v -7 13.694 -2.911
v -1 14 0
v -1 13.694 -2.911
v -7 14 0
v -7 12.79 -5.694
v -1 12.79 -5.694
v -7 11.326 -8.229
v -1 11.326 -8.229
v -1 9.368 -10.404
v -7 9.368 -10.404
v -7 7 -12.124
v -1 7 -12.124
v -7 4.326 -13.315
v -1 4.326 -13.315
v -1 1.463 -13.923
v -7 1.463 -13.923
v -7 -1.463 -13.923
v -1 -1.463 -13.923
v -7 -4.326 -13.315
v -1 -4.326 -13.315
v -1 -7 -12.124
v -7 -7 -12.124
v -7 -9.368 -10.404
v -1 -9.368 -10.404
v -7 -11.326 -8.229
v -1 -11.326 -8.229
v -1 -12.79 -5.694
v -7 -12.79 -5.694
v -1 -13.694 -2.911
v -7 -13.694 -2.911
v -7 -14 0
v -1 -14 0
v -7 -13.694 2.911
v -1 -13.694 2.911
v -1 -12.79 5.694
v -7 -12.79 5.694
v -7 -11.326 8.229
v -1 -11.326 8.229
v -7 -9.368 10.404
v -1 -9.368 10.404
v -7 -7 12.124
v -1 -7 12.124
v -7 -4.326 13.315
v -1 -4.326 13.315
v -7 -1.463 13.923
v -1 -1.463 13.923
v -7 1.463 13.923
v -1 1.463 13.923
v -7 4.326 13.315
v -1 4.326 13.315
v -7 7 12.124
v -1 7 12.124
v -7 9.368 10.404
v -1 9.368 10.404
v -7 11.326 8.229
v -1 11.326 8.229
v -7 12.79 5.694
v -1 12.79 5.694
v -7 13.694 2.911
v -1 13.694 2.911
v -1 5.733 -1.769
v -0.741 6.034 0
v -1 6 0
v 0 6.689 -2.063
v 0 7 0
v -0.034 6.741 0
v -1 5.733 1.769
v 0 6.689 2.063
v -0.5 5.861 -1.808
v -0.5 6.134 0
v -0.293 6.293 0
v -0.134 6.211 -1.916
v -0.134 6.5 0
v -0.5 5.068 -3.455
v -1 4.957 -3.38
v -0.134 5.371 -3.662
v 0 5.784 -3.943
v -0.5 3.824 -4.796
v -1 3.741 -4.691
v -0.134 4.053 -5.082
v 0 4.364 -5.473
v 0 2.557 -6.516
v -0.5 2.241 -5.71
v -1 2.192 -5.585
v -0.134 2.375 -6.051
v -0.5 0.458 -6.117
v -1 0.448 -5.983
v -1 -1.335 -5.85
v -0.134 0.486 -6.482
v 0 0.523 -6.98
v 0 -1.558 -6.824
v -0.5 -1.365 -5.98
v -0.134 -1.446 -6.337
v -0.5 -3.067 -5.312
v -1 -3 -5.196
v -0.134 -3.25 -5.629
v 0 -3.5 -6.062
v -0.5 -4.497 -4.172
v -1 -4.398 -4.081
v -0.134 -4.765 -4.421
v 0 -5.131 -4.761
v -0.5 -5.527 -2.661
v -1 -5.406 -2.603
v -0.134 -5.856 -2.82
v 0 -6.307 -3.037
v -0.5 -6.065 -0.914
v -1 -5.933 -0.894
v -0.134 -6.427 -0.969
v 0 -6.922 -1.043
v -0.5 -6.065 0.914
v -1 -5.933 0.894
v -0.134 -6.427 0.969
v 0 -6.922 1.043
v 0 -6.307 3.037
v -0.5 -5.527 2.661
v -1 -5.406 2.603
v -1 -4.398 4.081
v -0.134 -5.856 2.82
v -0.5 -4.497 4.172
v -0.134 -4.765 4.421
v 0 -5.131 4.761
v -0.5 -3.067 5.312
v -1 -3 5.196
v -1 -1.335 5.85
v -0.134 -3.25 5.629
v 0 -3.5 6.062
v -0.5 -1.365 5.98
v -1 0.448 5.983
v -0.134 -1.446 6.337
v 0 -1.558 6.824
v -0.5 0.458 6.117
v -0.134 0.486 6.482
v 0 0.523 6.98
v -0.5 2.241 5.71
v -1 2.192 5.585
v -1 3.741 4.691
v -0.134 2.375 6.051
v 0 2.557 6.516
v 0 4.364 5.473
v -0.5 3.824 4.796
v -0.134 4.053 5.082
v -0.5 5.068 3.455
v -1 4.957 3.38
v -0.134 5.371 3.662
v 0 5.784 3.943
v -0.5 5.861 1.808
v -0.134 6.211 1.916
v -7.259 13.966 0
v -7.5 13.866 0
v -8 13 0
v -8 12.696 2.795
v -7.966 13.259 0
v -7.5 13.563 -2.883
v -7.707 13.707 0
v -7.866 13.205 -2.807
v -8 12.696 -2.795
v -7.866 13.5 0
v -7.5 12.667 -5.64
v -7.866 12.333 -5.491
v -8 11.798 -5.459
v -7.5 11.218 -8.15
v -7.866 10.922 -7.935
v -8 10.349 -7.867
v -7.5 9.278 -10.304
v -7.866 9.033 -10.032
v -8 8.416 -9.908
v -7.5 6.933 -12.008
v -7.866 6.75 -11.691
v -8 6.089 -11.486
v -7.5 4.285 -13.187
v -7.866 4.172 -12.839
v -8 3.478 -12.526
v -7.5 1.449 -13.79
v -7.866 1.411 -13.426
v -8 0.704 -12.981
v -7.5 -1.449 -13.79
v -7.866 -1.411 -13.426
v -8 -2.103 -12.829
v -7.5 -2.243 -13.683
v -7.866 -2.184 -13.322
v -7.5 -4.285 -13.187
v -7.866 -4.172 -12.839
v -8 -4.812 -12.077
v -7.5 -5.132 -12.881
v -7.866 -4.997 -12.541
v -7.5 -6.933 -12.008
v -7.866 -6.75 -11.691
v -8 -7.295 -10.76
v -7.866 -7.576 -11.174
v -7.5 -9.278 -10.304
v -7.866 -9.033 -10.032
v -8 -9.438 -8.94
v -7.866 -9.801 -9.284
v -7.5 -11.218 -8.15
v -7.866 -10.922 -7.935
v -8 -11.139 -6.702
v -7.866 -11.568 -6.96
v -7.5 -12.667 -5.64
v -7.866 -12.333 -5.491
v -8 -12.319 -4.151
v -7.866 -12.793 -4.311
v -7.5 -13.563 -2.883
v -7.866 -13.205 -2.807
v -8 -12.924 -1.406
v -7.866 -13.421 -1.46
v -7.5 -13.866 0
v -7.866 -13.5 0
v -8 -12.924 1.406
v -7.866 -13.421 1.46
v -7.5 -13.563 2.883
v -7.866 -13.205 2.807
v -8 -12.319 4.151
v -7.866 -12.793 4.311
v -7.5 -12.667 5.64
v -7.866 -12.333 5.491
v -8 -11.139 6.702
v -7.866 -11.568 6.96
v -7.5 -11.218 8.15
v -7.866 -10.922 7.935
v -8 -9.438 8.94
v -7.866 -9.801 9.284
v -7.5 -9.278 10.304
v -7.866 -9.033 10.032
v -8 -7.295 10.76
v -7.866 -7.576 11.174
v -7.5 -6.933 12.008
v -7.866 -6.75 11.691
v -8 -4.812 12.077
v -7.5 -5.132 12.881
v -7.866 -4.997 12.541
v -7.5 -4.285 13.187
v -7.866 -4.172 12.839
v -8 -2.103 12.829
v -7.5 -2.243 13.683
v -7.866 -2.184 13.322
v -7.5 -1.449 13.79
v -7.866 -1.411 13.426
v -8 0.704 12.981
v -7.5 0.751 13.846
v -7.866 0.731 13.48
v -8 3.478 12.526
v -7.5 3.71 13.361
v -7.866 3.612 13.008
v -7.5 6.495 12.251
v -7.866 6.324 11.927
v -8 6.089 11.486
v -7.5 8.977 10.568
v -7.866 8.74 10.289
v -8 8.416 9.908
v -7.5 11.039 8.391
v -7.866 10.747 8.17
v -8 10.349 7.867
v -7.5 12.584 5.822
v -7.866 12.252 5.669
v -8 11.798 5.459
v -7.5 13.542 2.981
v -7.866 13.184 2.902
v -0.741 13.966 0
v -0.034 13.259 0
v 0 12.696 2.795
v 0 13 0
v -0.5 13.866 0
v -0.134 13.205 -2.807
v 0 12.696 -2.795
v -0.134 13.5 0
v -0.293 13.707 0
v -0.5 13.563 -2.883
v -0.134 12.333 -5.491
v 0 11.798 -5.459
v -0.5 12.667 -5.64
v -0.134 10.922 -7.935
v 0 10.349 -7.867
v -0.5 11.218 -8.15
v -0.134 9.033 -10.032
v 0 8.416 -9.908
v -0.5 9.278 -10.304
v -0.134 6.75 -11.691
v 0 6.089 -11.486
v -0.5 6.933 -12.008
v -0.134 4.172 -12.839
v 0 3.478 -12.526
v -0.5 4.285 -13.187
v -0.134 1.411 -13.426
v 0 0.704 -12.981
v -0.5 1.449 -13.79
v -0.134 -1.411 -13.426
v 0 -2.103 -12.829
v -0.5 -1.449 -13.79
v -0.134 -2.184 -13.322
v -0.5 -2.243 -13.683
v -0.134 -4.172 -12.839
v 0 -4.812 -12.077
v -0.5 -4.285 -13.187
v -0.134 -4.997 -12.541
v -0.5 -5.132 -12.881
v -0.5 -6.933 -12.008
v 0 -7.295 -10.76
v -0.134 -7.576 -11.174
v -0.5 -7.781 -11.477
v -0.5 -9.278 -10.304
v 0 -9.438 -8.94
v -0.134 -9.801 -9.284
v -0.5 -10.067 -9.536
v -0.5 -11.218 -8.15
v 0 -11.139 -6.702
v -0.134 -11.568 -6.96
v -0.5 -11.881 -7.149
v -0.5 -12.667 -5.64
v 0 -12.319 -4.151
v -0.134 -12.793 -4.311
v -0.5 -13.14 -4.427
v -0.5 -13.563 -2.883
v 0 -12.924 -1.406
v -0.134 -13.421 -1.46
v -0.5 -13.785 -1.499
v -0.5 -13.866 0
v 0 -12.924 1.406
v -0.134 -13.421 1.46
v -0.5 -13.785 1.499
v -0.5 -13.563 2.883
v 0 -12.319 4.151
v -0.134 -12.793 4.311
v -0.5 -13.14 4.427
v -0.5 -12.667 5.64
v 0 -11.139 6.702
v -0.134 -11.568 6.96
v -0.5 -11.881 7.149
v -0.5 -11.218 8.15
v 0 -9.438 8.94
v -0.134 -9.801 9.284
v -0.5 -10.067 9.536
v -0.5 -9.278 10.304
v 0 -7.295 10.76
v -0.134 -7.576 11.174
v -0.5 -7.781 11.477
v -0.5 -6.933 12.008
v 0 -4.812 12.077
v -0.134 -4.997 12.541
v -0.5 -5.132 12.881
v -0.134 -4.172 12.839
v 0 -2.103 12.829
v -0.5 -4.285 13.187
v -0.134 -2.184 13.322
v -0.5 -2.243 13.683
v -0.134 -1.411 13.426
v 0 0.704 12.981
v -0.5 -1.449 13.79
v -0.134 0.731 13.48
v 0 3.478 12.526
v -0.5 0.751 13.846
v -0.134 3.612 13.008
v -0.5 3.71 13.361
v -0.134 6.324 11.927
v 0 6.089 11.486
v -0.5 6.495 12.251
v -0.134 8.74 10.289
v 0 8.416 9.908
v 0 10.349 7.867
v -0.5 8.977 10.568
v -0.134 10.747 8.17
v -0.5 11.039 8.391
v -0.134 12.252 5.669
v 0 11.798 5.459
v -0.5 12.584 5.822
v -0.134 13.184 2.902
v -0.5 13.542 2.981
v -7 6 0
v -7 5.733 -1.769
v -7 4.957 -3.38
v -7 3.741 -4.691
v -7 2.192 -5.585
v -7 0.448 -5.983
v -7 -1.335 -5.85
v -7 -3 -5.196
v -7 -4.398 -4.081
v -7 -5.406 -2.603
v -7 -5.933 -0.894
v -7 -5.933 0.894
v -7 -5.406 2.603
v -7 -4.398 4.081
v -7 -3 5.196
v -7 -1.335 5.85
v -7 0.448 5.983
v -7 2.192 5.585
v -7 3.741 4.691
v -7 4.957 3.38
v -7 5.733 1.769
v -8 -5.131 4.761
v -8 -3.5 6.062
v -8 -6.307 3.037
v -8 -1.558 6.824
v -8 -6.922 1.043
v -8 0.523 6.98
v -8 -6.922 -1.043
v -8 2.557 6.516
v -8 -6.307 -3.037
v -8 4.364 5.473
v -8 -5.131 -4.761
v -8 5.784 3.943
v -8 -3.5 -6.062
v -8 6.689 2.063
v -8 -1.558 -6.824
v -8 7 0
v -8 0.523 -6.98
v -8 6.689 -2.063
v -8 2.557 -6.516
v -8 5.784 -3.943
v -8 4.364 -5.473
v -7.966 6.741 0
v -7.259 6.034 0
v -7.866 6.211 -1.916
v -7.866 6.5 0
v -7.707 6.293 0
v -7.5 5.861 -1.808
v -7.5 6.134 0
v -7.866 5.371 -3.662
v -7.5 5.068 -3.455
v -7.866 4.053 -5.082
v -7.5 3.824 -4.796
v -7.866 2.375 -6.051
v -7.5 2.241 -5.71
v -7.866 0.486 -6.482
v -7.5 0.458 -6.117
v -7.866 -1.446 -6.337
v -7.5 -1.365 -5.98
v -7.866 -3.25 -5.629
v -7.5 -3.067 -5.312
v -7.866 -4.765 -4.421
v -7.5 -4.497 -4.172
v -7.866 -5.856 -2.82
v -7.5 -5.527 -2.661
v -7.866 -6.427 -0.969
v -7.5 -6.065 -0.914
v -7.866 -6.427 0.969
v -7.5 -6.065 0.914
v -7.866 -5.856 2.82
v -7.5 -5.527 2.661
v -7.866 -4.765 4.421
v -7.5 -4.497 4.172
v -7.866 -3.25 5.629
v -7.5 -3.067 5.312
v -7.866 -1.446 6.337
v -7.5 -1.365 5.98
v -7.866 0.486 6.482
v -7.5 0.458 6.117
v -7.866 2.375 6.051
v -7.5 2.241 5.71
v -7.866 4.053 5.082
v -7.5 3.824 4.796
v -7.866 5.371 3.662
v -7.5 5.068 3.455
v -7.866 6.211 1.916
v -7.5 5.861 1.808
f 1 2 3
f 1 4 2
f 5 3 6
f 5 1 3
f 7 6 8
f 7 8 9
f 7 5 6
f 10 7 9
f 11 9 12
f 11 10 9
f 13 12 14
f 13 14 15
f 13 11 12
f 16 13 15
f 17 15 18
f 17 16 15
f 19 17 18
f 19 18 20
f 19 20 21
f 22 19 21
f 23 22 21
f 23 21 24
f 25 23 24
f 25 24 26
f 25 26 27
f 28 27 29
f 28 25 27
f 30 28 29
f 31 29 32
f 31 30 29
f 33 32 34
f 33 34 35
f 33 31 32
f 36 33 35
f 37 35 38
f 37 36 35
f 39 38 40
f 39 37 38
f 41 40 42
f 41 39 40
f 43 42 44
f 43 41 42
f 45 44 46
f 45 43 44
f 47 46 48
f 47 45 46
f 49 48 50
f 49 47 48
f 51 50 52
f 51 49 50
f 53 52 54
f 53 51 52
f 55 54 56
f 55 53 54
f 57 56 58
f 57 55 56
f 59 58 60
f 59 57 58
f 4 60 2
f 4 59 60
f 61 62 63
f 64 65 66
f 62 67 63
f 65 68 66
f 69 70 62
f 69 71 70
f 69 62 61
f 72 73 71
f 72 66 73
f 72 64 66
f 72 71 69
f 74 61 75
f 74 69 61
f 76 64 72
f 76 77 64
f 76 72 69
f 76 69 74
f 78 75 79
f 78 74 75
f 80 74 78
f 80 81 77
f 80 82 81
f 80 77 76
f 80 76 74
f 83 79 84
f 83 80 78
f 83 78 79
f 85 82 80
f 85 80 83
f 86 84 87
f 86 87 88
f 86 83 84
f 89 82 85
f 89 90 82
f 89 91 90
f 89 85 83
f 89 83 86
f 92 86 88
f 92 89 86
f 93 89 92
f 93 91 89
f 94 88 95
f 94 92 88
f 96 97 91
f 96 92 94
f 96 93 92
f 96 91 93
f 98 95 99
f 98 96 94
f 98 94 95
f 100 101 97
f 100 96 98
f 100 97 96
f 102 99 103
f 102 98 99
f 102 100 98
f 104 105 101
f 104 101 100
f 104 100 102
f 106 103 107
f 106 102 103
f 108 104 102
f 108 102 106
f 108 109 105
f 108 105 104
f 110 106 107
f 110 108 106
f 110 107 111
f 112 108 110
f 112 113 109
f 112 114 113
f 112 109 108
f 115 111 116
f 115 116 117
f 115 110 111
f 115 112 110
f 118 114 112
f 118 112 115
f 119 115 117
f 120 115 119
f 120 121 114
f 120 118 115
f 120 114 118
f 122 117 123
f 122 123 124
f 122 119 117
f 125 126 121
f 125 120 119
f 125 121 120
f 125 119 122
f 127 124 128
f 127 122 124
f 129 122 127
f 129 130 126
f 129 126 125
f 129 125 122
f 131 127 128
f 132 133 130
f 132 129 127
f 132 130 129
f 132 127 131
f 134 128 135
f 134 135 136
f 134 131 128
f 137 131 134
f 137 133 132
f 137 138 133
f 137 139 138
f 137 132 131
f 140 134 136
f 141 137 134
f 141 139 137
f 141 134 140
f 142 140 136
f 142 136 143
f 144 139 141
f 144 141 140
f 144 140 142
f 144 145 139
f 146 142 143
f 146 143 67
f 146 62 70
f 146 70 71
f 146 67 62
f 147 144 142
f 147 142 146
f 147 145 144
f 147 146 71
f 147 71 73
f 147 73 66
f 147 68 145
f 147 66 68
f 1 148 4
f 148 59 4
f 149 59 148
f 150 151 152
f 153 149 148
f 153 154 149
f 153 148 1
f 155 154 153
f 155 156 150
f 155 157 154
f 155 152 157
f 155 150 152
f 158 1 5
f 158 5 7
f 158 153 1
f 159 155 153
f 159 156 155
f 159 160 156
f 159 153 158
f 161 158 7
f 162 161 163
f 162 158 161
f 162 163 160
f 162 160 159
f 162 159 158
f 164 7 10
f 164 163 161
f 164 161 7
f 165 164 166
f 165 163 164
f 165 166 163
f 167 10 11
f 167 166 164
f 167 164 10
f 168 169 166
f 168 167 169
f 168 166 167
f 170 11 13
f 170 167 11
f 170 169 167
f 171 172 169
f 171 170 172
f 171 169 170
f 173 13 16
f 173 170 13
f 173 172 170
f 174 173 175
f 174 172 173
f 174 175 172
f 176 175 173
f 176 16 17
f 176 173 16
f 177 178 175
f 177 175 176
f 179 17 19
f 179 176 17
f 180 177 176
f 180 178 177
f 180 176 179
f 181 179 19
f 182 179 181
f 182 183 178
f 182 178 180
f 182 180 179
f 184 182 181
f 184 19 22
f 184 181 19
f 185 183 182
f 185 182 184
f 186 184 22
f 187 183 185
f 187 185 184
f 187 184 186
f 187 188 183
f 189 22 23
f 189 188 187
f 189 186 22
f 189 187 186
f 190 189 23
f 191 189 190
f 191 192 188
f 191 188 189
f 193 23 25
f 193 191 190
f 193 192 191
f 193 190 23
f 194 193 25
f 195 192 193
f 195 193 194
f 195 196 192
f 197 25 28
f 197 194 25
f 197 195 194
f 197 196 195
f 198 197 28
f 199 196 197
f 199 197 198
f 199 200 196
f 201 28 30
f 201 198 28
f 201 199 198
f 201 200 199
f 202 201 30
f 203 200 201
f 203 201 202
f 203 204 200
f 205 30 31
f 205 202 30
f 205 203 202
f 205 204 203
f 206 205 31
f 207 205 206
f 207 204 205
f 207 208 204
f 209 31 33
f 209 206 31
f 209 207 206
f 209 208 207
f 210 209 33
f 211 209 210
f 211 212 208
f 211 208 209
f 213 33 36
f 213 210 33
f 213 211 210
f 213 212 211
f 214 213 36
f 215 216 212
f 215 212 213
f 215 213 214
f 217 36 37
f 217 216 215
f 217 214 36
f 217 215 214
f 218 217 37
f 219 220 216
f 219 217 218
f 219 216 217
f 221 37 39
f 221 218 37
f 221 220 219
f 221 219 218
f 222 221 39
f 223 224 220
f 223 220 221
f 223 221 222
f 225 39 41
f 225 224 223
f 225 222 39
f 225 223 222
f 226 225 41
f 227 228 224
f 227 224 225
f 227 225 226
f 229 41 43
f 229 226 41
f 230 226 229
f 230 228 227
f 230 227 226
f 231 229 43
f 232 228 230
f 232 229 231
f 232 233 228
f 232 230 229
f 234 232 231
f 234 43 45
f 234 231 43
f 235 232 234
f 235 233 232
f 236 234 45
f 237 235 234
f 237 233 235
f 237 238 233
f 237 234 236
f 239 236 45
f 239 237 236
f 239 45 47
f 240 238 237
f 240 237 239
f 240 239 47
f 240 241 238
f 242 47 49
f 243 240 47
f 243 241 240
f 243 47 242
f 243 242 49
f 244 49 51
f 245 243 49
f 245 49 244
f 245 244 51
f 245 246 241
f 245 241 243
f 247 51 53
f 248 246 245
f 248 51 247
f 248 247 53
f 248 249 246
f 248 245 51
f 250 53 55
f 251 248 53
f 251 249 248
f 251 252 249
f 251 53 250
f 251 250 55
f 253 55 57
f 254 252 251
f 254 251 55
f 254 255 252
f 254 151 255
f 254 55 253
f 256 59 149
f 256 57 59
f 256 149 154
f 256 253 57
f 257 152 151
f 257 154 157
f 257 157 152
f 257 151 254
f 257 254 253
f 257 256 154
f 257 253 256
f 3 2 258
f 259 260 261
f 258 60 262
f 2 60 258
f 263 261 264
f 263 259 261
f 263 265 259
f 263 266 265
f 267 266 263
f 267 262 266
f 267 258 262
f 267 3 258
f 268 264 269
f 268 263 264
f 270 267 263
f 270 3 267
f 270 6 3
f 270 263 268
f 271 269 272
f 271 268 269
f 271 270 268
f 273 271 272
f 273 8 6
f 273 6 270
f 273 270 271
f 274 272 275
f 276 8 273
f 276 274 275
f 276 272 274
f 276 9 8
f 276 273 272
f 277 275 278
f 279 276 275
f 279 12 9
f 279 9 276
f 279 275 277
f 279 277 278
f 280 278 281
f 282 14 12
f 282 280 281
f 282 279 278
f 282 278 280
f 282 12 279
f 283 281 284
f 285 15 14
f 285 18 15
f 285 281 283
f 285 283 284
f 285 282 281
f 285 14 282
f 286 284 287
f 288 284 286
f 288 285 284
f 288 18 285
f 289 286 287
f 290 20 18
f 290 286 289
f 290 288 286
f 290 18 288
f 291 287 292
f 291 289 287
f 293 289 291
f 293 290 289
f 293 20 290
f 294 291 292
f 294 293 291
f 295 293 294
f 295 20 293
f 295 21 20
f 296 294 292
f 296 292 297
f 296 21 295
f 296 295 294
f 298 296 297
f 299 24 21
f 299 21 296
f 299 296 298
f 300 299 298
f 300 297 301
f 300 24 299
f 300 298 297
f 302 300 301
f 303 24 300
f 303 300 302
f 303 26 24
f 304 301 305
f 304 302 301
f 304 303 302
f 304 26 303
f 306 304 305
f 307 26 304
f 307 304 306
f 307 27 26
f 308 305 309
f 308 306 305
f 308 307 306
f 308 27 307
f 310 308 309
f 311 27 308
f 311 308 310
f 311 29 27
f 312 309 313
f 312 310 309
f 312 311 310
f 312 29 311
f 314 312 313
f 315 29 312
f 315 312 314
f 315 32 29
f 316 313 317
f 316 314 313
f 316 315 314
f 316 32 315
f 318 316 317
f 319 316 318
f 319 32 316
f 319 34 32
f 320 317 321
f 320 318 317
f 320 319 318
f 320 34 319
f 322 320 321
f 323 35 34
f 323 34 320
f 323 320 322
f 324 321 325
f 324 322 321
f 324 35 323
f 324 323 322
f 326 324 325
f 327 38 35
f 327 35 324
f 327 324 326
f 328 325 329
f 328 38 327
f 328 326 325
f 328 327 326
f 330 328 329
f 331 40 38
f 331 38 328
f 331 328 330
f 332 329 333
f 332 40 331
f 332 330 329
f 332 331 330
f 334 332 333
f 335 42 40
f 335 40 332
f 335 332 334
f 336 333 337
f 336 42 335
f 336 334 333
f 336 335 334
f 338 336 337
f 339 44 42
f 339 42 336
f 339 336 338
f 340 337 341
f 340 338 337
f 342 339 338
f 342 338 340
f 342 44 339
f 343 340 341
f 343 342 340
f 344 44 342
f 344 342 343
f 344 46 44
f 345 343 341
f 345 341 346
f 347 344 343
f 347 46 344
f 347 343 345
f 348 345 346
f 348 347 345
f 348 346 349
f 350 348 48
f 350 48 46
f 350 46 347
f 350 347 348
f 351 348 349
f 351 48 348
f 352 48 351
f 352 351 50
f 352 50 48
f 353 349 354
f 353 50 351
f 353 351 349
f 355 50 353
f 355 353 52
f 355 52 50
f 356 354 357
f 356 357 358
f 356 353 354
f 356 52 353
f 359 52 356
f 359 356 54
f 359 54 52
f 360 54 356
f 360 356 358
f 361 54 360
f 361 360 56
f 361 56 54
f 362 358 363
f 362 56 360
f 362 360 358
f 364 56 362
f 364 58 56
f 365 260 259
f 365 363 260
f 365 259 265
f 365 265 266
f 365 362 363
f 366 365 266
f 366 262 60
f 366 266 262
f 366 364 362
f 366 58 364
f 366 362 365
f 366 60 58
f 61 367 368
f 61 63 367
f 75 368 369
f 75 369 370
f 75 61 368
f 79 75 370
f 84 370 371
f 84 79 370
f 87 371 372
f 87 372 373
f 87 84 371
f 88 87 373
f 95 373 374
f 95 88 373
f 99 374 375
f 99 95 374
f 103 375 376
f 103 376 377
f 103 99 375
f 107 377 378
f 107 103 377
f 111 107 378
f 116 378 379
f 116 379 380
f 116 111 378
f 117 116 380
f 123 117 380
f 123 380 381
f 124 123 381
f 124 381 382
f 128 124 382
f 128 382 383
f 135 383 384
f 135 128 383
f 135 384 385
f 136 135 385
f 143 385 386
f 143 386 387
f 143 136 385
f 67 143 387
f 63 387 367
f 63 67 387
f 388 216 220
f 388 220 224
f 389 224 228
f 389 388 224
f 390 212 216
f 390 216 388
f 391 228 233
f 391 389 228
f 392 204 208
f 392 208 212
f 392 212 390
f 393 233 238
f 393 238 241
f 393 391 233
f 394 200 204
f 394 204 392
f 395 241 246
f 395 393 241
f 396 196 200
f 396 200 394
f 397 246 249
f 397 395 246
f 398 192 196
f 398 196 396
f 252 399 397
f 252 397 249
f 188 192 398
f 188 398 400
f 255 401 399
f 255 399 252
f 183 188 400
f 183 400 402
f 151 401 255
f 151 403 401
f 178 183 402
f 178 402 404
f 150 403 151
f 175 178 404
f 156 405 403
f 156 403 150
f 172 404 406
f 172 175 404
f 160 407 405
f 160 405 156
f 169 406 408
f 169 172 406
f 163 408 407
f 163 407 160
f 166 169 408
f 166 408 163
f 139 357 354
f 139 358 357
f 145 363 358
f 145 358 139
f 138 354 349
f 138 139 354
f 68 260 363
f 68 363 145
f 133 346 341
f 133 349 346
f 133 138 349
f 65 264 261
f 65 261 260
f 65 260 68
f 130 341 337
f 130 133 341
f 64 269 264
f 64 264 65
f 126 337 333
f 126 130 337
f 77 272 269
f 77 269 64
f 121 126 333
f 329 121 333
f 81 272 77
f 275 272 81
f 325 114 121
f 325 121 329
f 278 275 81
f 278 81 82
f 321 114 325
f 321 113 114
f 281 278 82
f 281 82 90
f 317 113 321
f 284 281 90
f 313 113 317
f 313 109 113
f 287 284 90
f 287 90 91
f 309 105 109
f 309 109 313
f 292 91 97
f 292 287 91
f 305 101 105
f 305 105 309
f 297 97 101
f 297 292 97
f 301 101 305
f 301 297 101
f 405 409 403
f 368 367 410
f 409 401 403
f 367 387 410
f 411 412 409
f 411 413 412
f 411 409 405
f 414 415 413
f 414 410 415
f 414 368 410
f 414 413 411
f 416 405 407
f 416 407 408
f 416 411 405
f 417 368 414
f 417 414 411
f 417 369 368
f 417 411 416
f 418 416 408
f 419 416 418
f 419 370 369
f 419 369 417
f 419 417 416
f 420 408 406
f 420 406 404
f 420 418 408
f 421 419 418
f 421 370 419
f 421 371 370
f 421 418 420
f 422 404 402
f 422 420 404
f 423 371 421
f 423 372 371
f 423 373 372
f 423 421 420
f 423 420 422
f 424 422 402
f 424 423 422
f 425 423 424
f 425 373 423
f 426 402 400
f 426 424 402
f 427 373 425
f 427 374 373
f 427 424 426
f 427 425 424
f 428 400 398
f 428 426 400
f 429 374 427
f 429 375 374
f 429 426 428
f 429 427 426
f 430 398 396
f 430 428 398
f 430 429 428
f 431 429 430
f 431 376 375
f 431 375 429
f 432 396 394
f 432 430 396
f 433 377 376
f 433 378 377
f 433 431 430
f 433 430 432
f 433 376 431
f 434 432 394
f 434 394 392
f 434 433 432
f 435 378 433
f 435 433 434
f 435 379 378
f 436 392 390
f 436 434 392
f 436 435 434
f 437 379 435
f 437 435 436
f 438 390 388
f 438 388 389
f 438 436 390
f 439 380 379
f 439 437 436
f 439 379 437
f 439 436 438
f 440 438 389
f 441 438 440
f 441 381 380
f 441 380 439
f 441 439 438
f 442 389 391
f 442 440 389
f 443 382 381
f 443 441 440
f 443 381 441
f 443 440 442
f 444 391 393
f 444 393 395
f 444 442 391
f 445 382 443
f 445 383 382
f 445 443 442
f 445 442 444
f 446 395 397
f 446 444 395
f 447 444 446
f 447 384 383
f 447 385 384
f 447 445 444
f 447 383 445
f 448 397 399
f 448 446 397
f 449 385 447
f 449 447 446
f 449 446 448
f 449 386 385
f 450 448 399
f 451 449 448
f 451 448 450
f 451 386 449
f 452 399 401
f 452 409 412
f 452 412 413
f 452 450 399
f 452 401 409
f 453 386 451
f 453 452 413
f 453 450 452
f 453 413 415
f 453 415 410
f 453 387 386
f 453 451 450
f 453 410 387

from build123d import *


with BuildPart() as part:
    # Эскиз1 → Повернуть1 (revolve)
    with BuildSketch(Plane.XY):
        with BuildLine():
            Line((0, 7), (0, 13))
            ThreePointArc((0, 13), (-0.292893219, 13.707106781), (-1, 14))
            Line((-1, 14), (-7, 14))
            ThreePointArc((-7, 14), (-7.707106781, 13.707106781), (-8, 13))
            Line((-8, 13), (-8, 7))
            ThreePointArc((-8, 7), (-7.707106781, 6.292893219), (-7, 6))
            Line((-7, 6), (-1, 6))
            ThreePointArc((-1, 6), (-0.292893219, 6.292893219), (0, 7))
        make_face()
    revolve(axis=Axis((0, 0, 0), (-1, 0, 0)))


solid = part.part
